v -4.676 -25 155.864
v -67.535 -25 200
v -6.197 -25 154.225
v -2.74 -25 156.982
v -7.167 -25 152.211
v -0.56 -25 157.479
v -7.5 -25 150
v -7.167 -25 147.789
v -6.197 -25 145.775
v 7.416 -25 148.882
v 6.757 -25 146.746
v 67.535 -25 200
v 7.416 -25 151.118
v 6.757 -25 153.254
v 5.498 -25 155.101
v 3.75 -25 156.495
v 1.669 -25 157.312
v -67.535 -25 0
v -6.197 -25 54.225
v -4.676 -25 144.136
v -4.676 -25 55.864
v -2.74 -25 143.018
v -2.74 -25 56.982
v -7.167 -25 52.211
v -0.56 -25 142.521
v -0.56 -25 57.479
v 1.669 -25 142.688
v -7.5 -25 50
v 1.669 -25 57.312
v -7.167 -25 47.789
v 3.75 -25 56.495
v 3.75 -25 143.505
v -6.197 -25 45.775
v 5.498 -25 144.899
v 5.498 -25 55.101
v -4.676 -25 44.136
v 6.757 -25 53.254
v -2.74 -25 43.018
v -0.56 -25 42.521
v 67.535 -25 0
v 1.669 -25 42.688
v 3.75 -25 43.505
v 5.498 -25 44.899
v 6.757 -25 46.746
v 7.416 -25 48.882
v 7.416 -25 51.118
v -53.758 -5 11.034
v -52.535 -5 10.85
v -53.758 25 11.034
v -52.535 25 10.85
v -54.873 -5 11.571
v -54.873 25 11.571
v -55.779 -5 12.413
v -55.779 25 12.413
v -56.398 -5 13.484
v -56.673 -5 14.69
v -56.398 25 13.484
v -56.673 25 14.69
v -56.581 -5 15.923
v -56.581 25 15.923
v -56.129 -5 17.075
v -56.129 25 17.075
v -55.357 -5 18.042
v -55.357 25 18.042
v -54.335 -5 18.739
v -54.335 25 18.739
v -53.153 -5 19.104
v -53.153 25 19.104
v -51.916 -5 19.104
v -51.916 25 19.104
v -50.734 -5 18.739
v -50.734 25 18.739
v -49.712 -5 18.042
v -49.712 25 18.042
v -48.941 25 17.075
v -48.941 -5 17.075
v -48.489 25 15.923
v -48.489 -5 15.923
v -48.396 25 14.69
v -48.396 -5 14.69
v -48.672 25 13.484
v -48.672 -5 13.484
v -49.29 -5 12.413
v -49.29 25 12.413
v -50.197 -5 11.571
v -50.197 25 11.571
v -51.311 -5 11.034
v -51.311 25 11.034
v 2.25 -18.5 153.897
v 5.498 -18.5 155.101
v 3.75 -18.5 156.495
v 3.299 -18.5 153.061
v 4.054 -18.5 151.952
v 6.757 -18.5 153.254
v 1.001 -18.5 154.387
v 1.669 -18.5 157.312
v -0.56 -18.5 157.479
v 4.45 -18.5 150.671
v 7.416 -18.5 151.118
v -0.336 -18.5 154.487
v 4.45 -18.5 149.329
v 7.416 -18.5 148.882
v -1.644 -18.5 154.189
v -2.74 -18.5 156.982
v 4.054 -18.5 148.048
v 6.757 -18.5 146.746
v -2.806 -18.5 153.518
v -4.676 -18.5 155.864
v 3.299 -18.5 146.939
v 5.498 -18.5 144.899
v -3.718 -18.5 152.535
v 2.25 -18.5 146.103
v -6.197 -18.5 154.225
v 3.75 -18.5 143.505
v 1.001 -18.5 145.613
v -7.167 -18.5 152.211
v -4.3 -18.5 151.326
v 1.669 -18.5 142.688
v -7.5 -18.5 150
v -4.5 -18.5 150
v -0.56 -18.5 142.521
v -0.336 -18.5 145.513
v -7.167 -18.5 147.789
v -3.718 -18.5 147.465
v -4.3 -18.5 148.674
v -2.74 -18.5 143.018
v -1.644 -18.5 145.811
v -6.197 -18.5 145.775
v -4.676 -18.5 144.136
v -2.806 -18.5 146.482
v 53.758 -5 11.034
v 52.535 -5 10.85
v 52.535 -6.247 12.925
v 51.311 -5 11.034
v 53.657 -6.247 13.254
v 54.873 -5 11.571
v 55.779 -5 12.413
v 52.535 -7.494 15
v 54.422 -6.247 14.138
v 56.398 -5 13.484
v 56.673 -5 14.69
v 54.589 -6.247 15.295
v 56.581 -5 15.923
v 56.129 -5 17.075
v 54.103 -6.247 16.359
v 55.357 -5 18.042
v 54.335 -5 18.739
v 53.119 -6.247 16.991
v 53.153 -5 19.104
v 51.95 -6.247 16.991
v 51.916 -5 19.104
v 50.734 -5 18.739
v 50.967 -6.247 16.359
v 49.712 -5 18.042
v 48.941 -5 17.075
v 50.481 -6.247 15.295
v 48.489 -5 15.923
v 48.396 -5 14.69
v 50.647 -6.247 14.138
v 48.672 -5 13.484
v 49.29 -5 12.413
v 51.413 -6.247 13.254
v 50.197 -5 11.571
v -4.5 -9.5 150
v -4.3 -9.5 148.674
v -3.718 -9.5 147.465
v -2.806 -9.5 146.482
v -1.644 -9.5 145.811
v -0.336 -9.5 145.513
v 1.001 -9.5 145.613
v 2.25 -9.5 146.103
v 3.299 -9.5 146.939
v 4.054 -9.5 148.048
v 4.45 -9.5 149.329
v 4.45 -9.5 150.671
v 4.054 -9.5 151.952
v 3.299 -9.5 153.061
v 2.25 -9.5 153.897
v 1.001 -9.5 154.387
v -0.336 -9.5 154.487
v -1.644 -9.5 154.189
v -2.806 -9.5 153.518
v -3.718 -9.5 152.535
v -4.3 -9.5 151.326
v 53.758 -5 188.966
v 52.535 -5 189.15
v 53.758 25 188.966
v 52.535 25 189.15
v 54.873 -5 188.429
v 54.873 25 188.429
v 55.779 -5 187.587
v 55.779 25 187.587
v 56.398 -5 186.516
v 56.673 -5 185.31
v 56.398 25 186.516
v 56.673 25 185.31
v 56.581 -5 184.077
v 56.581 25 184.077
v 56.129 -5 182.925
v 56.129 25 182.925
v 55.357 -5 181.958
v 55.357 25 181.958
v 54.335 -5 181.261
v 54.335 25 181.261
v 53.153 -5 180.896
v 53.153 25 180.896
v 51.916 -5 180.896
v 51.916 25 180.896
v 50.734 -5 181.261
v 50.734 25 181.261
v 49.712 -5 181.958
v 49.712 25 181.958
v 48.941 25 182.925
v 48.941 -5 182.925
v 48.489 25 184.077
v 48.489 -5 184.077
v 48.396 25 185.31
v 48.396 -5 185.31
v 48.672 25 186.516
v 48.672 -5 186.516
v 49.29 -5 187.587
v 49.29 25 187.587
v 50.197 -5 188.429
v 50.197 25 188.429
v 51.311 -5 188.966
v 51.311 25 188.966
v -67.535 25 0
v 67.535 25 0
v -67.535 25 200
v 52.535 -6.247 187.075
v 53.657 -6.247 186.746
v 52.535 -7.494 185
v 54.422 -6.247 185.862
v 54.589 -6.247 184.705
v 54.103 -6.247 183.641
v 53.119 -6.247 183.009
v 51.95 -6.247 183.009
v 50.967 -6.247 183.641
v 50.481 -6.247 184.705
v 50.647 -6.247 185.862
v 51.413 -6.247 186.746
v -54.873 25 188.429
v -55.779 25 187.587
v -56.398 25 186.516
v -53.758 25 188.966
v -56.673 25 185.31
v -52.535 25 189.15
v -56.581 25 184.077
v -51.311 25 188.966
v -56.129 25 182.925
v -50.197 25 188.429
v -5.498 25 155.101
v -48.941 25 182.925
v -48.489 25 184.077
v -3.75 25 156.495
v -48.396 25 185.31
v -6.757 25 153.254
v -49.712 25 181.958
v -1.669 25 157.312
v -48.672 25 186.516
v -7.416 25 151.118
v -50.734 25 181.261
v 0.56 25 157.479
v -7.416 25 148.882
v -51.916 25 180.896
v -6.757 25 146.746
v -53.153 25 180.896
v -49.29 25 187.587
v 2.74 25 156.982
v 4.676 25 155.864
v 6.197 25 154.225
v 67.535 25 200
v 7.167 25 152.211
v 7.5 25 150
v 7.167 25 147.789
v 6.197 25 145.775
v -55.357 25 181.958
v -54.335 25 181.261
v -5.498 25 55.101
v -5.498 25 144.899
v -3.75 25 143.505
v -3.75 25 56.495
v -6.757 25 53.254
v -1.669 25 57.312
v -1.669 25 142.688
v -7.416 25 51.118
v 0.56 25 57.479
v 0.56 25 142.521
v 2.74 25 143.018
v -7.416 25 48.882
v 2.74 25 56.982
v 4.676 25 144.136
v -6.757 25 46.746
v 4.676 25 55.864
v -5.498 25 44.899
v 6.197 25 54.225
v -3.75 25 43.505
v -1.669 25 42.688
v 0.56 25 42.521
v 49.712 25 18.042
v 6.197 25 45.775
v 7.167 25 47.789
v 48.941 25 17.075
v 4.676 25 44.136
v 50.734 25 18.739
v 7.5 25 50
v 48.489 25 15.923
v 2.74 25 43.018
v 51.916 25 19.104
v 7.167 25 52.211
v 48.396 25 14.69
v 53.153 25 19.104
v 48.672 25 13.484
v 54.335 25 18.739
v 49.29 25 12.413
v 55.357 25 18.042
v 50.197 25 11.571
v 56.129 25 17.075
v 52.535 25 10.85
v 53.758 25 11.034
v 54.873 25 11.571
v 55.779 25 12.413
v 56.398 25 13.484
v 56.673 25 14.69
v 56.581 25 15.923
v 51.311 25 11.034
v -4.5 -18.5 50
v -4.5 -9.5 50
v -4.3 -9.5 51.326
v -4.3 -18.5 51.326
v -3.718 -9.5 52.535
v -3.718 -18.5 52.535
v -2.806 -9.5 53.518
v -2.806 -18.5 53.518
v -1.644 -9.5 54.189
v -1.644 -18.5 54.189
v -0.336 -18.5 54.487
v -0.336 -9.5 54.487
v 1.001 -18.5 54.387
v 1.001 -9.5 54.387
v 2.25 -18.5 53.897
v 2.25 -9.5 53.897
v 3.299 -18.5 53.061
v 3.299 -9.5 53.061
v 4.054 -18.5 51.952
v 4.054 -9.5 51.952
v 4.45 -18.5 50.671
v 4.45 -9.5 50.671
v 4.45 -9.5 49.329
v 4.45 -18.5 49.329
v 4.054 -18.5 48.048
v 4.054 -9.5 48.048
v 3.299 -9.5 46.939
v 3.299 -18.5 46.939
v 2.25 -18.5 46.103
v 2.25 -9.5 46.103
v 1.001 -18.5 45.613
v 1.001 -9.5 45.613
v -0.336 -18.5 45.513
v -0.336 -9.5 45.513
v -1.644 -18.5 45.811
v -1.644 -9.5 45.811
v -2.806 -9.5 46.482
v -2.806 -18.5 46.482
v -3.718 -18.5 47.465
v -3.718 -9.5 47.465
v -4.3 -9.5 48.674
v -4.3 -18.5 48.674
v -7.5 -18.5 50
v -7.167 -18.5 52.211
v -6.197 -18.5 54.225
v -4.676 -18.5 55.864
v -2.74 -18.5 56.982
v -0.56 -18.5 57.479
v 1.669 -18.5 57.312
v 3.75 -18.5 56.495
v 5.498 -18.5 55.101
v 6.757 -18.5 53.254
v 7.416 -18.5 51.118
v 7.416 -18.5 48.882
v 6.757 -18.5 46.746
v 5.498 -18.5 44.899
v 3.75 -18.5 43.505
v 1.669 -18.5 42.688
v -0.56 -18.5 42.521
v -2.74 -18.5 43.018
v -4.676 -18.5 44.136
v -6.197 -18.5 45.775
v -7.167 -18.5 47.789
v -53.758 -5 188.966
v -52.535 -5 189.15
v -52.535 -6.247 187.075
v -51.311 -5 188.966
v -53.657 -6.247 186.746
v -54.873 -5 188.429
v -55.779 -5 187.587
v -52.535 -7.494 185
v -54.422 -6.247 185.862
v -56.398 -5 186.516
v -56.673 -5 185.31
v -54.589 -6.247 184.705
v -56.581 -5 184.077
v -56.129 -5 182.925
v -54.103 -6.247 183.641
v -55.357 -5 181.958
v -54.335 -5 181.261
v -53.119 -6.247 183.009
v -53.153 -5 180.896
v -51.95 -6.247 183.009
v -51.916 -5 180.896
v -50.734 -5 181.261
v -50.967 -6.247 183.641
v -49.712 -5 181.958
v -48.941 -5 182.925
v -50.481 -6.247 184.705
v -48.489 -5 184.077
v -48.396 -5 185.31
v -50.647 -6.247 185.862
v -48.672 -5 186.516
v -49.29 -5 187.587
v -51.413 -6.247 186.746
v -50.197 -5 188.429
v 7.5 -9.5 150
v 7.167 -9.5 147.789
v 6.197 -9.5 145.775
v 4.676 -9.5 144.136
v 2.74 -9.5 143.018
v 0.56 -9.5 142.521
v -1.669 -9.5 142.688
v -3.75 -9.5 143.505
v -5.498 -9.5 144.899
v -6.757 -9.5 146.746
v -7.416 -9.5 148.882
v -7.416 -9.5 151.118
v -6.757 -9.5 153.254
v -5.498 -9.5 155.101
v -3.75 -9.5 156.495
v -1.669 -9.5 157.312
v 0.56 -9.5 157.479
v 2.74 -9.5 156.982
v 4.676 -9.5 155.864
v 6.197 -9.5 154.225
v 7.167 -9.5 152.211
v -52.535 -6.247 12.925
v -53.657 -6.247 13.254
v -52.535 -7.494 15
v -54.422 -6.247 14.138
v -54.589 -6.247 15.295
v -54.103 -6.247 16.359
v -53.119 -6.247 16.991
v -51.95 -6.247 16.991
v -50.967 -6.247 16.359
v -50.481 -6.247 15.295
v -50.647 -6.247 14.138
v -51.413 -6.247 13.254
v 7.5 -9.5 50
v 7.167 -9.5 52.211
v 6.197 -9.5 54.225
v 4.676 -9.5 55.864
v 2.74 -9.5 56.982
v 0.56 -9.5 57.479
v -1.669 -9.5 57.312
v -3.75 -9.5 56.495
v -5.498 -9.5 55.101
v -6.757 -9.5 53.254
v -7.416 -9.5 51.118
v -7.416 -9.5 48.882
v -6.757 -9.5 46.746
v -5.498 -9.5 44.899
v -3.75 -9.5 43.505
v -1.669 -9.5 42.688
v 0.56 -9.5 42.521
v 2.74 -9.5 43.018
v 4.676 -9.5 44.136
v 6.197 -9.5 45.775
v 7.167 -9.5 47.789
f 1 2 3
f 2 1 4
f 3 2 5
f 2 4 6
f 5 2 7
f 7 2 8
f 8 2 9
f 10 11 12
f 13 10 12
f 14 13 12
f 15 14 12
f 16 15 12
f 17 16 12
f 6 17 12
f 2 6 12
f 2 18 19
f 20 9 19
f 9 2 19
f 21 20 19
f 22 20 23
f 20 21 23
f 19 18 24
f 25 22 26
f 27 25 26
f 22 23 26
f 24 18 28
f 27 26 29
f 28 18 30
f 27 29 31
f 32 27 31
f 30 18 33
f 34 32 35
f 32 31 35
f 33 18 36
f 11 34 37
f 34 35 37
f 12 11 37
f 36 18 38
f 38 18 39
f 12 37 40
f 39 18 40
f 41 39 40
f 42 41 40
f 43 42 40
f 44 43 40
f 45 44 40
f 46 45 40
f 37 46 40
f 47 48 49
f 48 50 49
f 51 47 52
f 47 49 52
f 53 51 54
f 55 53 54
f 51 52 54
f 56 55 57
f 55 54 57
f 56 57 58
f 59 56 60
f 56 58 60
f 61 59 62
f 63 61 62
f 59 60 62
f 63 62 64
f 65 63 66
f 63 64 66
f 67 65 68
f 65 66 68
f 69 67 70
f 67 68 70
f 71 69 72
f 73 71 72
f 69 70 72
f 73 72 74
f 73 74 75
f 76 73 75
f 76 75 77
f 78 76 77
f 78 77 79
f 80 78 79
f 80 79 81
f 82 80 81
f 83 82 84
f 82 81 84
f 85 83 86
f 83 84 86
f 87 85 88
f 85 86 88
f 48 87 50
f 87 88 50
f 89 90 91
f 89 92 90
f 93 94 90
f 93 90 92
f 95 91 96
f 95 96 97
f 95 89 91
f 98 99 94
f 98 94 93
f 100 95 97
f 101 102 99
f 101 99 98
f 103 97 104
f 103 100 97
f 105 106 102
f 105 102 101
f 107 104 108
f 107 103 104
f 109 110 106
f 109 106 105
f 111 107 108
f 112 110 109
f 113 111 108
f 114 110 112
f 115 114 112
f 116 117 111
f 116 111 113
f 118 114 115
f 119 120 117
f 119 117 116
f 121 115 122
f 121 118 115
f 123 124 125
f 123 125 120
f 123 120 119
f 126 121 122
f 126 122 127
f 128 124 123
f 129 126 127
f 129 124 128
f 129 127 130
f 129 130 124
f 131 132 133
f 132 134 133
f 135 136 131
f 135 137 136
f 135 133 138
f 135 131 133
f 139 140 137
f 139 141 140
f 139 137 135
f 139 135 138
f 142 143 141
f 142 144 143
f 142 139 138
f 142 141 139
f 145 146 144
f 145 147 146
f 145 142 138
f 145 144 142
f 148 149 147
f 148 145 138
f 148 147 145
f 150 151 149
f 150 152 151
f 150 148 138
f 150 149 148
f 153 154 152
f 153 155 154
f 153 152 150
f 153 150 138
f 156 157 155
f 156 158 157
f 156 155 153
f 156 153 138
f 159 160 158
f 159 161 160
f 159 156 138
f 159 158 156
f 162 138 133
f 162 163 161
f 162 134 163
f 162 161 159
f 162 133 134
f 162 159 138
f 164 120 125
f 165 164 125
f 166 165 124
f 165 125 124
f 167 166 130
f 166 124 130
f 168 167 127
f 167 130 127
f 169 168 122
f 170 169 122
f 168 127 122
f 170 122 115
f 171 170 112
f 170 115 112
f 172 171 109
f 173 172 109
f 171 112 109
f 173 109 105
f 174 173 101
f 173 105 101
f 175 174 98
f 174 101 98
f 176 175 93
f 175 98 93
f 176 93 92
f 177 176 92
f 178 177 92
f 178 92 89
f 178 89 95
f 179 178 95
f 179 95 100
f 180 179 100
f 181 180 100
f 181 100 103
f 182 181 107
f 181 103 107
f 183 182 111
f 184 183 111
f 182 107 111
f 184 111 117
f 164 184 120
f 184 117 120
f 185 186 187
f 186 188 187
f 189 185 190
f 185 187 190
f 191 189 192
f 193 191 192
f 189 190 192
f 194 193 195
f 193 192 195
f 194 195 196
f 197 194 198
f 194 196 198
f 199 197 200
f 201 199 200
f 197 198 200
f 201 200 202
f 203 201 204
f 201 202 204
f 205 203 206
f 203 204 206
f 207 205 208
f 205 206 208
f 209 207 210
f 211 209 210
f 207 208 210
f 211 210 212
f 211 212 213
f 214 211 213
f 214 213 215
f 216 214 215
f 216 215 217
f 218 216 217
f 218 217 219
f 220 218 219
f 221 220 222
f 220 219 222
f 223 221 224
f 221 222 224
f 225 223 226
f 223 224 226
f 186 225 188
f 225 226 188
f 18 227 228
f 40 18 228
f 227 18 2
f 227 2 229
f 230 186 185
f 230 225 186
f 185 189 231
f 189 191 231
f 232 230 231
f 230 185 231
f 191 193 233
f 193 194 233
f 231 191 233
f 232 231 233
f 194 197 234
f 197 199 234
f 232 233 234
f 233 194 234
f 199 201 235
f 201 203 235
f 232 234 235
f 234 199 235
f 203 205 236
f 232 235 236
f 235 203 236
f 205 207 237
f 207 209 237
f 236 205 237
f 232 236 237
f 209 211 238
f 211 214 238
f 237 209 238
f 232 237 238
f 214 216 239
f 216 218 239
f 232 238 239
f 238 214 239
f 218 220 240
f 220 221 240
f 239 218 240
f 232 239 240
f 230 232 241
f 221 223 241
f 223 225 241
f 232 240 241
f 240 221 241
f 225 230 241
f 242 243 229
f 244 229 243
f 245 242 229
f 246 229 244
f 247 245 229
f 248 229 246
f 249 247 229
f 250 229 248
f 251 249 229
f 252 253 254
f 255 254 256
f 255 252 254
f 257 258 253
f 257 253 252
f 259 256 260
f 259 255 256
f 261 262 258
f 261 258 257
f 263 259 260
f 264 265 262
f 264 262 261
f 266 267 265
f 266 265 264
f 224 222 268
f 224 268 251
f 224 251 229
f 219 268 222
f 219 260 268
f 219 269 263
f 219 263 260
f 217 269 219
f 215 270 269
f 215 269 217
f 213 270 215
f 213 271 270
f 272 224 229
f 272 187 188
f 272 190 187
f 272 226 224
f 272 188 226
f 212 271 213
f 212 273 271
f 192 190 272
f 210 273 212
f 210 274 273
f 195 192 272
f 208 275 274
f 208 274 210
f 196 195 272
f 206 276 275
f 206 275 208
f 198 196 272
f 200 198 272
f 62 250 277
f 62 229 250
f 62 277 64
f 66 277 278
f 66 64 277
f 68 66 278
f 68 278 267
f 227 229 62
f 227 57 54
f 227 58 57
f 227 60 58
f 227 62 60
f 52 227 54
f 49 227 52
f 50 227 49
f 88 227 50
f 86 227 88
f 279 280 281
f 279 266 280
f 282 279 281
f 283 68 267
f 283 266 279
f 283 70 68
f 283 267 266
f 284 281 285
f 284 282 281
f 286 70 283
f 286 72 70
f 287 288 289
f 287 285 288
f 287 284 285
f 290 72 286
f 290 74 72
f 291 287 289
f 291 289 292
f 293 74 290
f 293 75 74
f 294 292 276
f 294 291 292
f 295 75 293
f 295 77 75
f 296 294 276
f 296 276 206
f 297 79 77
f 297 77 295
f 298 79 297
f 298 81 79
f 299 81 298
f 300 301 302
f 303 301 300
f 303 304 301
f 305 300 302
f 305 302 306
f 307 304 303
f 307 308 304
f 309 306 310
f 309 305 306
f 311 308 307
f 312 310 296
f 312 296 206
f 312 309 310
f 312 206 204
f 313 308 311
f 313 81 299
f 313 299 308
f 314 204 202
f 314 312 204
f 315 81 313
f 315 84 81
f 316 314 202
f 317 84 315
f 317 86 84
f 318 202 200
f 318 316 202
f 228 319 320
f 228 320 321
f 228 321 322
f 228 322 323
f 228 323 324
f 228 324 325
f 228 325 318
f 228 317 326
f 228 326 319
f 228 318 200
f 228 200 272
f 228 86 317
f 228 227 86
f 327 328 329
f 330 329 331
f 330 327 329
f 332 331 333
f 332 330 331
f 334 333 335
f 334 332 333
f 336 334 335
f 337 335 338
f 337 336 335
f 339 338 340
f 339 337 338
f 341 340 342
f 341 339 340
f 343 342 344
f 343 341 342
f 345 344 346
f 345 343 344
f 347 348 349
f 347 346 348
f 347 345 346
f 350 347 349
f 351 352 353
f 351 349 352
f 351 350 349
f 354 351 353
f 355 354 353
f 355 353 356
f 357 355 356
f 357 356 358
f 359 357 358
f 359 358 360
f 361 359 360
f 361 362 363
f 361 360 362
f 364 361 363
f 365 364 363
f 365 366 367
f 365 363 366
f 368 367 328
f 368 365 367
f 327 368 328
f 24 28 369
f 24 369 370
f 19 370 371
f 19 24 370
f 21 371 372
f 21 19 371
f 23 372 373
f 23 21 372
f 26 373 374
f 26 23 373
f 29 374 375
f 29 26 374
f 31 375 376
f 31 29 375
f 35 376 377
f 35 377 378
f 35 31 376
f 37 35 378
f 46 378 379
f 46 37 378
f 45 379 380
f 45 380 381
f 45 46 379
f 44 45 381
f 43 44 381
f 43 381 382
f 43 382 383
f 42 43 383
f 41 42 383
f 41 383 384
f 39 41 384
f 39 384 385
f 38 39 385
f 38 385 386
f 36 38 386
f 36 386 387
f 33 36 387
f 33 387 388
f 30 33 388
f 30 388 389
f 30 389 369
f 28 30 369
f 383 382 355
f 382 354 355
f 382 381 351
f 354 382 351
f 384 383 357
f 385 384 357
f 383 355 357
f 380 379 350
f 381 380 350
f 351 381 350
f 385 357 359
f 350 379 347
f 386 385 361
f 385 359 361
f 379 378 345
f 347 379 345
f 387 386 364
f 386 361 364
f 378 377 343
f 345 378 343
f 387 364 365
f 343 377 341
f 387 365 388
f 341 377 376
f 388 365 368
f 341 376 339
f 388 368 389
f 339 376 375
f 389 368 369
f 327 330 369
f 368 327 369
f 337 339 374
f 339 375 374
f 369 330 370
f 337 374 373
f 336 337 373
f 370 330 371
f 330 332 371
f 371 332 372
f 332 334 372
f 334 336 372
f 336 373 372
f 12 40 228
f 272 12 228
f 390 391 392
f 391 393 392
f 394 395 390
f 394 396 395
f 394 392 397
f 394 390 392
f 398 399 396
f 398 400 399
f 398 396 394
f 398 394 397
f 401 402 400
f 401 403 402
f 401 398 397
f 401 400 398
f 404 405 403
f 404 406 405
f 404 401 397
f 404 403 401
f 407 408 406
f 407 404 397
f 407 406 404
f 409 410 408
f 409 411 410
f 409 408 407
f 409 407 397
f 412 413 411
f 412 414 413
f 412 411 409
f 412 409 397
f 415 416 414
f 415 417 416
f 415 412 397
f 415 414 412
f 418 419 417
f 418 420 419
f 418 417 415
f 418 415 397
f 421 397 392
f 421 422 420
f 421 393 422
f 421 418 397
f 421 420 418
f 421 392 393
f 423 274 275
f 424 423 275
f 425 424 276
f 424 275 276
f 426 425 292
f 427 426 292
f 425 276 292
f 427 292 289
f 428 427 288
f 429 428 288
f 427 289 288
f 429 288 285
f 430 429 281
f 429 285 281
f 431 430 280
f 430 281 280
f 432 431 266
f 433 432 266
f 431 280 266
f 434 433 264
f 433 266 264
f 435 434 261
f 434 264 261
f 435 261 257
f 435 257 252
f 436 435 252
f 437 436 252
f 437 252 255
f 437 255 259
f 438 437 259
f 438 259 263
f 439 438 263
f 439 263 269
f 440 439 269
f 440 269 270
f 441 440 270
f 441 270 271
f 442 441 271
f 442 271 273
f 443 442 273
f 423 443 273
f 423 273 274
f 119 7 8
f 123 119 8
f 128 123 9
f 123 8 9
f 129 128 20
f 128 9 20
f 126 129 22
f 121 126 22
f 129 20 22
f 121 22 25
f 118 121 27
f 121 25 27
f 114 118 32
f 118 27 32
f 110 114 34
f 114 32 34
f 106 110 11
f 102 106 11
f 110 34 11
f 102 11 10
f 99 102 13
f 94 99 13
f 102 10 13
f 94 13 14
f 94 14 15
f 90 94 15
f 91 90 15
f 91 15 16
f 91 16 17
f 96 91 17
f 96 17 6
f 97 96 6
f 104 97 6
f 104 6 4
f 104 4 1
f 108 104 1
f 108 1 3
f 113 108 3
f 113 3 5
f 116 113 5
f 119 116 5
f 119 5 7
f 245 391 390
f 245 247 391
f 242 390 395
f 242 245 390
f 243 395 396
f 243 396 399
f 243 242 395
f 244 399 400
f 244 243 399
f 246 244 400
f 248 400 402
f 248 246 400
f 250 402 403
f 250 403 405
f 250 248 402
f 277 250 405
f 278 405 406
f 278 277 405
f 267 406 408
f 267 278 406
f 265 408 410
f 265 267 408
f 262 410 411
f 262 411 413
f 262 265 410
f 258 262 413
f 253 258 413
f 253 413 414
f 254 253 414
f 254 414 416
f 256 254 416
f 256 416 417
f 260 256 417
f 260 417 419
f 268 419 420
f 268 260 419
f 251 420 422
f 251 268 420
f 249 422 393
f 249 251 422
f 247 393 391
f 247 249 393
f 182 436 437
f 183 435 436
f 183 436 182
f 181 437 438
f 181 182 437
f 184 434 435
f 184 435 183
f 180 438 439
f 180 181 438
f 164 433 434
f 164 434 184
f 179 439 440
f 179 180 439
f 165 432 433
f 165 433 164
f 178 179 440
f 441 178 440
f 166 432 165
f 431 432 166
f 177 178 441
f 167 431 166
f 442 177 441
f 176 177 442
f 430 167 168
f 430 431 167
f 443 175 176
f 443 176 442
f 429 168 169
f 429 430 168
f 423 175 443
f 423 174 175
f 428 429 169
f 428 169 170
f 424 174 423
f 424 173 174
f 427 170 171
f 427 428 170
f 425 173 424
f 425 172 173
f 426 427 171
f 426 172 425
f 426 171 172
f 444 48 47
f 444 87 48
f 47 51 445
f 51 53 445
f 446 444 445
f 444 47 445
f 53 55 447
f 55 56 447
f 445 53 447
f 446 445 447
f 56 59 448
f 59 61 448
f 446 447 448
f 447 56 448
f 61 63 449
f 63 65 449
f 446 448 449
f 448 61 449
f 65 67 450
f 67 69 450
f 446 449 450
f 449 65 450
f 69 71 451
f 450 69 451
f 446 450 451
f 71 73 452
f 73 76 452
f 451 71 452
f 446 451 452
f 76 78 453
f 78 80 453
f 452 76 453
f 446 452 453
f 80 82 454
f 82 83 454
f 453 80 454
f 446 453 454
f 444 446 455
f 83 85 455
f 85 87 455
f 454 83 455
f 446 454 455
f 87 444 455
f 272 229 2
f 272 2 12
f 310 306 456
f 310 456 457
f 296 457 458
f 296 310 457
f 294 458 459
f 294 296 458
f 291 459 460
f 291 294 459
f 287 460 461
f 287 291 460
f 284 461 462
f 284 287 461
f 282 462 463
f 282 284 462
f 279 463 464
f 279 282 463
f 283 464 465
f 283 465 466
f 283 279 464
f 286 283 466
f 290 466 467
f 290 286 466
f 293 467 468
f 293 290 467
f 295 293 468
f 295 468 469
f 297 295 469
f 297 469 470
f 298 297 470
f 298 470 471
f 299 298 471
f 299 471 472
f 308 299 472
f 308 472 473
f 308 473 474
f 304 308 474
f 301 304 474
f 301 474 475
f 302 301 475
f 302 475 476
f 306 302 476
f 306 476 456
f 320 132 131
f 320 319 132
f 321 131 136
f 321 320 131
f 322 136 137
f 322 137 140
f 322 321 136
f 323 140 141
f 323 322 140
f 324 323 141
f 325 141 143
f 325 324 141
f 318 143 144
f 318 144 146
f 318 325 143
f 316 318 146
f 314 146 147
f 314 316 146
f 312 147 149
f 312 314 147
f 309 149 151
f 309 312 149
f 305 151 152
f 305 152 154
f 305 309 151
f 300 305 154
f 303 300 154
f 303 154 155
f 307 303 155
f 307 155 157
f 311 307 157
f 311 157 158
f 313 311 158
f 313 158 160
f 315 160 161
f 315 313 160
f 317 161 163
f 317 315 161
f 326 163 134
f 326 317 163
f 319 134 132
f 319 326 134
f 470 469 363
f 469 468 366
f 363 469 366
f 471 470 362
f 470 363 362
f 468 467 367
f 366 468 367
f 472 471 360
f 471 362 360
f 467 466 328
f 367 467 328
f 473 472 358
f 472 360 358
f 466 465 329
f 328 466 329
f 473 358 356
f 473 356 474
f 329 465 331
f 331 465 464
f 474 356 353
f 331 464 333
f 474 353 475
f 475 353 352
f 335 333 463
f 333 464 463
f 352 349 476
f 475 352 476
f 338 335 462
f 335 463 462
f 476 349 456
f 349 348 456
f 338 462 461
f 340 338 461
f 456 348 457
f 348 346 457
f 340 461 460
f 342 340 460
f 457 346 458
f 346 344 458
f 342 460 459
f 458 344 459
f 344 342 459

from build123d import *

# Parameters (mm, degrees)
SKIZZE1_W                                           = 135.069444444
SKIZZE1_H                                           = 50
AUFSATZ_LINEAR_AUSTRAGEN1_DEPTH                     = 200
STIRNSENKUNG_F_R_M8_SENKSCHRAUBE_KOPF_B_D           = 9
STIRNSENKUNG_F_R_M8_SENKSCHRAUBE_KOPF_B_CBORE_D     = 15
STIRNSENKUNG_F_R_M8_SENKSCHRAUBE_KOPF_B_CBORE_DEPTH = 34.5
STIRNSENKUNG_F_R_M8_SENKSCHRAUBE_KO_2_D             = 9
STIRNSENKUNG_F_R_M8_SENKSCHRAUBE_KO_2_DEPTH         = 50
STIRNSENKUNG_F_R_M8_SENKSCHRAUBE_KO_2_CBORE_D       = 15
STIRNSENKUNG_F_R_M8_SENKSCHRAUBE_KO_2_CBORE_DEPTH   = 6.5


with BuildPart() as part:
    # Skizze1 → Aufsatz-Linear austragen1 (new body)
    with BuildSketch(Plane.XY):
        Rectangle(SKIZZE1_W, SKIZZE1_H)
    extrude(amount=AUFSATZ_LINEAR_AUSTRAGEN1_DEPTH)

    # Stirnsenkung f_r M8 Senkschraube _Kopf B (through all)
    with Locations(Plane(origin=(0, 25, 0), x_dir=(1, 0, 0), z_dir=(0, 1, 0))):
        with Locations((0, -150)):
            stirnsenkung_f_r_m8_senkschraube_kopf_b = CounterBoreHole(STIRNSENKUNG_F_R_M8_SENKSCHRAUBE_KOPF_B_D / 2, STIRNSENKUNG_F_R_M8_SENKSCHRAUBE_KOPF_B_CBORE_D / 2, STIRNSENKUNG_F_R_M8_SENKSCHRAUBE_KOPF_B_CBORE_DEPTH)

    # Stirnsenkung f_r M8 Senkschraube _Ko 2
    with Locations(Plane(origin=(0, -25, 0), x_dir=(-1, 0, 0), z_dir=(0, -1, 0))):
        with Locations((0, -150)):
            stirnsenkung_f_r_m8_senkschraube_ko_2 = CounterBoreHole(STIRNSENKUNG_F_R_M8_SENKSCHRAUBE_KO_2_D / 2, STIRNSENKUNG_F_R_M8_SENKSCHRAUBE_KO_2_CBORE_D / 2, STIRNSENKUNG_F_R_M8_SENKSCHRAUBE_KO_2_CBORE_DEPTH, depth=STIRNSENKUNG_F_R_M8_SENKSCHRAUBE_KO_2_DEPTH)

    # Spiegeln1: Stirnsenkung f_r M8 Senkschraube _Kopf B, Stirnsenkung f_r M8 Senkschraube _Ko 2 across plane
    add(stirnsenkung_f_r_m8_senkschraube_kopf_b.mirror(Plane.XY.offset(100)), mode=Mode.SUBTRACT)
    add(stirnsenkung_f_r_m8_senkschraube_ko_2.mirror(Plane.XY.offset(100)), mode=Mode.SUBTRACT)

    # Skizze10 → Kernloch für M8 Helicoil1 (revolve, cut)
    with BuildSketch(Plane(origin=(-52.534722222, 25, 185), x_dir=(0, 0, 1), z_dir=(1, 0, 0))):
        Polygon((0, 0), (0, 32.493571569), (4.15, 30), (4.15, 0), align=None)
    kernloch_f_r_m8_helicoil1 = revolve(axis=Axis((-52.534722222, 31.35, 185), (0, -1, 0)), mode=Mode.SUBTRACT)

    # Spiegeln2: Kernloch für M8 Helicoil1 across plane
    add(kernloch_f_r_m8_helicoil1.mirror(Plane(origin=(0, 0, 0), x_dir=(0, 0, 1), z_dir=(1, 0, 0))), mode=Mode.SUBTRACT)

    # Spiegeln3: Kernloch für M8 Helicoil1 across plane
    add(kernloch_f_r_m8_helicoil1.mirror(Plane.XY.offset(100)), mode=Mode.SUBTRACT)

    # Spiegeln3 copy 1 sketch → Spiegeln3 copy 1 (revolve, cut)
    with BuildSketch(Plane(origin=(52.534722222, 25, 15), x_dir=(0, 0, -1), z_dir=(-1, 0, 0))):
        Polygon((0, 0), (0, 32.493571569), (4.15, 30), (4.15, 0), align=None)
    revolve(axis=Axis((52.534722222, 31.35, 15), (0, -1, 0)), mode=Mode.SUBTRACT)


solid = part.part
